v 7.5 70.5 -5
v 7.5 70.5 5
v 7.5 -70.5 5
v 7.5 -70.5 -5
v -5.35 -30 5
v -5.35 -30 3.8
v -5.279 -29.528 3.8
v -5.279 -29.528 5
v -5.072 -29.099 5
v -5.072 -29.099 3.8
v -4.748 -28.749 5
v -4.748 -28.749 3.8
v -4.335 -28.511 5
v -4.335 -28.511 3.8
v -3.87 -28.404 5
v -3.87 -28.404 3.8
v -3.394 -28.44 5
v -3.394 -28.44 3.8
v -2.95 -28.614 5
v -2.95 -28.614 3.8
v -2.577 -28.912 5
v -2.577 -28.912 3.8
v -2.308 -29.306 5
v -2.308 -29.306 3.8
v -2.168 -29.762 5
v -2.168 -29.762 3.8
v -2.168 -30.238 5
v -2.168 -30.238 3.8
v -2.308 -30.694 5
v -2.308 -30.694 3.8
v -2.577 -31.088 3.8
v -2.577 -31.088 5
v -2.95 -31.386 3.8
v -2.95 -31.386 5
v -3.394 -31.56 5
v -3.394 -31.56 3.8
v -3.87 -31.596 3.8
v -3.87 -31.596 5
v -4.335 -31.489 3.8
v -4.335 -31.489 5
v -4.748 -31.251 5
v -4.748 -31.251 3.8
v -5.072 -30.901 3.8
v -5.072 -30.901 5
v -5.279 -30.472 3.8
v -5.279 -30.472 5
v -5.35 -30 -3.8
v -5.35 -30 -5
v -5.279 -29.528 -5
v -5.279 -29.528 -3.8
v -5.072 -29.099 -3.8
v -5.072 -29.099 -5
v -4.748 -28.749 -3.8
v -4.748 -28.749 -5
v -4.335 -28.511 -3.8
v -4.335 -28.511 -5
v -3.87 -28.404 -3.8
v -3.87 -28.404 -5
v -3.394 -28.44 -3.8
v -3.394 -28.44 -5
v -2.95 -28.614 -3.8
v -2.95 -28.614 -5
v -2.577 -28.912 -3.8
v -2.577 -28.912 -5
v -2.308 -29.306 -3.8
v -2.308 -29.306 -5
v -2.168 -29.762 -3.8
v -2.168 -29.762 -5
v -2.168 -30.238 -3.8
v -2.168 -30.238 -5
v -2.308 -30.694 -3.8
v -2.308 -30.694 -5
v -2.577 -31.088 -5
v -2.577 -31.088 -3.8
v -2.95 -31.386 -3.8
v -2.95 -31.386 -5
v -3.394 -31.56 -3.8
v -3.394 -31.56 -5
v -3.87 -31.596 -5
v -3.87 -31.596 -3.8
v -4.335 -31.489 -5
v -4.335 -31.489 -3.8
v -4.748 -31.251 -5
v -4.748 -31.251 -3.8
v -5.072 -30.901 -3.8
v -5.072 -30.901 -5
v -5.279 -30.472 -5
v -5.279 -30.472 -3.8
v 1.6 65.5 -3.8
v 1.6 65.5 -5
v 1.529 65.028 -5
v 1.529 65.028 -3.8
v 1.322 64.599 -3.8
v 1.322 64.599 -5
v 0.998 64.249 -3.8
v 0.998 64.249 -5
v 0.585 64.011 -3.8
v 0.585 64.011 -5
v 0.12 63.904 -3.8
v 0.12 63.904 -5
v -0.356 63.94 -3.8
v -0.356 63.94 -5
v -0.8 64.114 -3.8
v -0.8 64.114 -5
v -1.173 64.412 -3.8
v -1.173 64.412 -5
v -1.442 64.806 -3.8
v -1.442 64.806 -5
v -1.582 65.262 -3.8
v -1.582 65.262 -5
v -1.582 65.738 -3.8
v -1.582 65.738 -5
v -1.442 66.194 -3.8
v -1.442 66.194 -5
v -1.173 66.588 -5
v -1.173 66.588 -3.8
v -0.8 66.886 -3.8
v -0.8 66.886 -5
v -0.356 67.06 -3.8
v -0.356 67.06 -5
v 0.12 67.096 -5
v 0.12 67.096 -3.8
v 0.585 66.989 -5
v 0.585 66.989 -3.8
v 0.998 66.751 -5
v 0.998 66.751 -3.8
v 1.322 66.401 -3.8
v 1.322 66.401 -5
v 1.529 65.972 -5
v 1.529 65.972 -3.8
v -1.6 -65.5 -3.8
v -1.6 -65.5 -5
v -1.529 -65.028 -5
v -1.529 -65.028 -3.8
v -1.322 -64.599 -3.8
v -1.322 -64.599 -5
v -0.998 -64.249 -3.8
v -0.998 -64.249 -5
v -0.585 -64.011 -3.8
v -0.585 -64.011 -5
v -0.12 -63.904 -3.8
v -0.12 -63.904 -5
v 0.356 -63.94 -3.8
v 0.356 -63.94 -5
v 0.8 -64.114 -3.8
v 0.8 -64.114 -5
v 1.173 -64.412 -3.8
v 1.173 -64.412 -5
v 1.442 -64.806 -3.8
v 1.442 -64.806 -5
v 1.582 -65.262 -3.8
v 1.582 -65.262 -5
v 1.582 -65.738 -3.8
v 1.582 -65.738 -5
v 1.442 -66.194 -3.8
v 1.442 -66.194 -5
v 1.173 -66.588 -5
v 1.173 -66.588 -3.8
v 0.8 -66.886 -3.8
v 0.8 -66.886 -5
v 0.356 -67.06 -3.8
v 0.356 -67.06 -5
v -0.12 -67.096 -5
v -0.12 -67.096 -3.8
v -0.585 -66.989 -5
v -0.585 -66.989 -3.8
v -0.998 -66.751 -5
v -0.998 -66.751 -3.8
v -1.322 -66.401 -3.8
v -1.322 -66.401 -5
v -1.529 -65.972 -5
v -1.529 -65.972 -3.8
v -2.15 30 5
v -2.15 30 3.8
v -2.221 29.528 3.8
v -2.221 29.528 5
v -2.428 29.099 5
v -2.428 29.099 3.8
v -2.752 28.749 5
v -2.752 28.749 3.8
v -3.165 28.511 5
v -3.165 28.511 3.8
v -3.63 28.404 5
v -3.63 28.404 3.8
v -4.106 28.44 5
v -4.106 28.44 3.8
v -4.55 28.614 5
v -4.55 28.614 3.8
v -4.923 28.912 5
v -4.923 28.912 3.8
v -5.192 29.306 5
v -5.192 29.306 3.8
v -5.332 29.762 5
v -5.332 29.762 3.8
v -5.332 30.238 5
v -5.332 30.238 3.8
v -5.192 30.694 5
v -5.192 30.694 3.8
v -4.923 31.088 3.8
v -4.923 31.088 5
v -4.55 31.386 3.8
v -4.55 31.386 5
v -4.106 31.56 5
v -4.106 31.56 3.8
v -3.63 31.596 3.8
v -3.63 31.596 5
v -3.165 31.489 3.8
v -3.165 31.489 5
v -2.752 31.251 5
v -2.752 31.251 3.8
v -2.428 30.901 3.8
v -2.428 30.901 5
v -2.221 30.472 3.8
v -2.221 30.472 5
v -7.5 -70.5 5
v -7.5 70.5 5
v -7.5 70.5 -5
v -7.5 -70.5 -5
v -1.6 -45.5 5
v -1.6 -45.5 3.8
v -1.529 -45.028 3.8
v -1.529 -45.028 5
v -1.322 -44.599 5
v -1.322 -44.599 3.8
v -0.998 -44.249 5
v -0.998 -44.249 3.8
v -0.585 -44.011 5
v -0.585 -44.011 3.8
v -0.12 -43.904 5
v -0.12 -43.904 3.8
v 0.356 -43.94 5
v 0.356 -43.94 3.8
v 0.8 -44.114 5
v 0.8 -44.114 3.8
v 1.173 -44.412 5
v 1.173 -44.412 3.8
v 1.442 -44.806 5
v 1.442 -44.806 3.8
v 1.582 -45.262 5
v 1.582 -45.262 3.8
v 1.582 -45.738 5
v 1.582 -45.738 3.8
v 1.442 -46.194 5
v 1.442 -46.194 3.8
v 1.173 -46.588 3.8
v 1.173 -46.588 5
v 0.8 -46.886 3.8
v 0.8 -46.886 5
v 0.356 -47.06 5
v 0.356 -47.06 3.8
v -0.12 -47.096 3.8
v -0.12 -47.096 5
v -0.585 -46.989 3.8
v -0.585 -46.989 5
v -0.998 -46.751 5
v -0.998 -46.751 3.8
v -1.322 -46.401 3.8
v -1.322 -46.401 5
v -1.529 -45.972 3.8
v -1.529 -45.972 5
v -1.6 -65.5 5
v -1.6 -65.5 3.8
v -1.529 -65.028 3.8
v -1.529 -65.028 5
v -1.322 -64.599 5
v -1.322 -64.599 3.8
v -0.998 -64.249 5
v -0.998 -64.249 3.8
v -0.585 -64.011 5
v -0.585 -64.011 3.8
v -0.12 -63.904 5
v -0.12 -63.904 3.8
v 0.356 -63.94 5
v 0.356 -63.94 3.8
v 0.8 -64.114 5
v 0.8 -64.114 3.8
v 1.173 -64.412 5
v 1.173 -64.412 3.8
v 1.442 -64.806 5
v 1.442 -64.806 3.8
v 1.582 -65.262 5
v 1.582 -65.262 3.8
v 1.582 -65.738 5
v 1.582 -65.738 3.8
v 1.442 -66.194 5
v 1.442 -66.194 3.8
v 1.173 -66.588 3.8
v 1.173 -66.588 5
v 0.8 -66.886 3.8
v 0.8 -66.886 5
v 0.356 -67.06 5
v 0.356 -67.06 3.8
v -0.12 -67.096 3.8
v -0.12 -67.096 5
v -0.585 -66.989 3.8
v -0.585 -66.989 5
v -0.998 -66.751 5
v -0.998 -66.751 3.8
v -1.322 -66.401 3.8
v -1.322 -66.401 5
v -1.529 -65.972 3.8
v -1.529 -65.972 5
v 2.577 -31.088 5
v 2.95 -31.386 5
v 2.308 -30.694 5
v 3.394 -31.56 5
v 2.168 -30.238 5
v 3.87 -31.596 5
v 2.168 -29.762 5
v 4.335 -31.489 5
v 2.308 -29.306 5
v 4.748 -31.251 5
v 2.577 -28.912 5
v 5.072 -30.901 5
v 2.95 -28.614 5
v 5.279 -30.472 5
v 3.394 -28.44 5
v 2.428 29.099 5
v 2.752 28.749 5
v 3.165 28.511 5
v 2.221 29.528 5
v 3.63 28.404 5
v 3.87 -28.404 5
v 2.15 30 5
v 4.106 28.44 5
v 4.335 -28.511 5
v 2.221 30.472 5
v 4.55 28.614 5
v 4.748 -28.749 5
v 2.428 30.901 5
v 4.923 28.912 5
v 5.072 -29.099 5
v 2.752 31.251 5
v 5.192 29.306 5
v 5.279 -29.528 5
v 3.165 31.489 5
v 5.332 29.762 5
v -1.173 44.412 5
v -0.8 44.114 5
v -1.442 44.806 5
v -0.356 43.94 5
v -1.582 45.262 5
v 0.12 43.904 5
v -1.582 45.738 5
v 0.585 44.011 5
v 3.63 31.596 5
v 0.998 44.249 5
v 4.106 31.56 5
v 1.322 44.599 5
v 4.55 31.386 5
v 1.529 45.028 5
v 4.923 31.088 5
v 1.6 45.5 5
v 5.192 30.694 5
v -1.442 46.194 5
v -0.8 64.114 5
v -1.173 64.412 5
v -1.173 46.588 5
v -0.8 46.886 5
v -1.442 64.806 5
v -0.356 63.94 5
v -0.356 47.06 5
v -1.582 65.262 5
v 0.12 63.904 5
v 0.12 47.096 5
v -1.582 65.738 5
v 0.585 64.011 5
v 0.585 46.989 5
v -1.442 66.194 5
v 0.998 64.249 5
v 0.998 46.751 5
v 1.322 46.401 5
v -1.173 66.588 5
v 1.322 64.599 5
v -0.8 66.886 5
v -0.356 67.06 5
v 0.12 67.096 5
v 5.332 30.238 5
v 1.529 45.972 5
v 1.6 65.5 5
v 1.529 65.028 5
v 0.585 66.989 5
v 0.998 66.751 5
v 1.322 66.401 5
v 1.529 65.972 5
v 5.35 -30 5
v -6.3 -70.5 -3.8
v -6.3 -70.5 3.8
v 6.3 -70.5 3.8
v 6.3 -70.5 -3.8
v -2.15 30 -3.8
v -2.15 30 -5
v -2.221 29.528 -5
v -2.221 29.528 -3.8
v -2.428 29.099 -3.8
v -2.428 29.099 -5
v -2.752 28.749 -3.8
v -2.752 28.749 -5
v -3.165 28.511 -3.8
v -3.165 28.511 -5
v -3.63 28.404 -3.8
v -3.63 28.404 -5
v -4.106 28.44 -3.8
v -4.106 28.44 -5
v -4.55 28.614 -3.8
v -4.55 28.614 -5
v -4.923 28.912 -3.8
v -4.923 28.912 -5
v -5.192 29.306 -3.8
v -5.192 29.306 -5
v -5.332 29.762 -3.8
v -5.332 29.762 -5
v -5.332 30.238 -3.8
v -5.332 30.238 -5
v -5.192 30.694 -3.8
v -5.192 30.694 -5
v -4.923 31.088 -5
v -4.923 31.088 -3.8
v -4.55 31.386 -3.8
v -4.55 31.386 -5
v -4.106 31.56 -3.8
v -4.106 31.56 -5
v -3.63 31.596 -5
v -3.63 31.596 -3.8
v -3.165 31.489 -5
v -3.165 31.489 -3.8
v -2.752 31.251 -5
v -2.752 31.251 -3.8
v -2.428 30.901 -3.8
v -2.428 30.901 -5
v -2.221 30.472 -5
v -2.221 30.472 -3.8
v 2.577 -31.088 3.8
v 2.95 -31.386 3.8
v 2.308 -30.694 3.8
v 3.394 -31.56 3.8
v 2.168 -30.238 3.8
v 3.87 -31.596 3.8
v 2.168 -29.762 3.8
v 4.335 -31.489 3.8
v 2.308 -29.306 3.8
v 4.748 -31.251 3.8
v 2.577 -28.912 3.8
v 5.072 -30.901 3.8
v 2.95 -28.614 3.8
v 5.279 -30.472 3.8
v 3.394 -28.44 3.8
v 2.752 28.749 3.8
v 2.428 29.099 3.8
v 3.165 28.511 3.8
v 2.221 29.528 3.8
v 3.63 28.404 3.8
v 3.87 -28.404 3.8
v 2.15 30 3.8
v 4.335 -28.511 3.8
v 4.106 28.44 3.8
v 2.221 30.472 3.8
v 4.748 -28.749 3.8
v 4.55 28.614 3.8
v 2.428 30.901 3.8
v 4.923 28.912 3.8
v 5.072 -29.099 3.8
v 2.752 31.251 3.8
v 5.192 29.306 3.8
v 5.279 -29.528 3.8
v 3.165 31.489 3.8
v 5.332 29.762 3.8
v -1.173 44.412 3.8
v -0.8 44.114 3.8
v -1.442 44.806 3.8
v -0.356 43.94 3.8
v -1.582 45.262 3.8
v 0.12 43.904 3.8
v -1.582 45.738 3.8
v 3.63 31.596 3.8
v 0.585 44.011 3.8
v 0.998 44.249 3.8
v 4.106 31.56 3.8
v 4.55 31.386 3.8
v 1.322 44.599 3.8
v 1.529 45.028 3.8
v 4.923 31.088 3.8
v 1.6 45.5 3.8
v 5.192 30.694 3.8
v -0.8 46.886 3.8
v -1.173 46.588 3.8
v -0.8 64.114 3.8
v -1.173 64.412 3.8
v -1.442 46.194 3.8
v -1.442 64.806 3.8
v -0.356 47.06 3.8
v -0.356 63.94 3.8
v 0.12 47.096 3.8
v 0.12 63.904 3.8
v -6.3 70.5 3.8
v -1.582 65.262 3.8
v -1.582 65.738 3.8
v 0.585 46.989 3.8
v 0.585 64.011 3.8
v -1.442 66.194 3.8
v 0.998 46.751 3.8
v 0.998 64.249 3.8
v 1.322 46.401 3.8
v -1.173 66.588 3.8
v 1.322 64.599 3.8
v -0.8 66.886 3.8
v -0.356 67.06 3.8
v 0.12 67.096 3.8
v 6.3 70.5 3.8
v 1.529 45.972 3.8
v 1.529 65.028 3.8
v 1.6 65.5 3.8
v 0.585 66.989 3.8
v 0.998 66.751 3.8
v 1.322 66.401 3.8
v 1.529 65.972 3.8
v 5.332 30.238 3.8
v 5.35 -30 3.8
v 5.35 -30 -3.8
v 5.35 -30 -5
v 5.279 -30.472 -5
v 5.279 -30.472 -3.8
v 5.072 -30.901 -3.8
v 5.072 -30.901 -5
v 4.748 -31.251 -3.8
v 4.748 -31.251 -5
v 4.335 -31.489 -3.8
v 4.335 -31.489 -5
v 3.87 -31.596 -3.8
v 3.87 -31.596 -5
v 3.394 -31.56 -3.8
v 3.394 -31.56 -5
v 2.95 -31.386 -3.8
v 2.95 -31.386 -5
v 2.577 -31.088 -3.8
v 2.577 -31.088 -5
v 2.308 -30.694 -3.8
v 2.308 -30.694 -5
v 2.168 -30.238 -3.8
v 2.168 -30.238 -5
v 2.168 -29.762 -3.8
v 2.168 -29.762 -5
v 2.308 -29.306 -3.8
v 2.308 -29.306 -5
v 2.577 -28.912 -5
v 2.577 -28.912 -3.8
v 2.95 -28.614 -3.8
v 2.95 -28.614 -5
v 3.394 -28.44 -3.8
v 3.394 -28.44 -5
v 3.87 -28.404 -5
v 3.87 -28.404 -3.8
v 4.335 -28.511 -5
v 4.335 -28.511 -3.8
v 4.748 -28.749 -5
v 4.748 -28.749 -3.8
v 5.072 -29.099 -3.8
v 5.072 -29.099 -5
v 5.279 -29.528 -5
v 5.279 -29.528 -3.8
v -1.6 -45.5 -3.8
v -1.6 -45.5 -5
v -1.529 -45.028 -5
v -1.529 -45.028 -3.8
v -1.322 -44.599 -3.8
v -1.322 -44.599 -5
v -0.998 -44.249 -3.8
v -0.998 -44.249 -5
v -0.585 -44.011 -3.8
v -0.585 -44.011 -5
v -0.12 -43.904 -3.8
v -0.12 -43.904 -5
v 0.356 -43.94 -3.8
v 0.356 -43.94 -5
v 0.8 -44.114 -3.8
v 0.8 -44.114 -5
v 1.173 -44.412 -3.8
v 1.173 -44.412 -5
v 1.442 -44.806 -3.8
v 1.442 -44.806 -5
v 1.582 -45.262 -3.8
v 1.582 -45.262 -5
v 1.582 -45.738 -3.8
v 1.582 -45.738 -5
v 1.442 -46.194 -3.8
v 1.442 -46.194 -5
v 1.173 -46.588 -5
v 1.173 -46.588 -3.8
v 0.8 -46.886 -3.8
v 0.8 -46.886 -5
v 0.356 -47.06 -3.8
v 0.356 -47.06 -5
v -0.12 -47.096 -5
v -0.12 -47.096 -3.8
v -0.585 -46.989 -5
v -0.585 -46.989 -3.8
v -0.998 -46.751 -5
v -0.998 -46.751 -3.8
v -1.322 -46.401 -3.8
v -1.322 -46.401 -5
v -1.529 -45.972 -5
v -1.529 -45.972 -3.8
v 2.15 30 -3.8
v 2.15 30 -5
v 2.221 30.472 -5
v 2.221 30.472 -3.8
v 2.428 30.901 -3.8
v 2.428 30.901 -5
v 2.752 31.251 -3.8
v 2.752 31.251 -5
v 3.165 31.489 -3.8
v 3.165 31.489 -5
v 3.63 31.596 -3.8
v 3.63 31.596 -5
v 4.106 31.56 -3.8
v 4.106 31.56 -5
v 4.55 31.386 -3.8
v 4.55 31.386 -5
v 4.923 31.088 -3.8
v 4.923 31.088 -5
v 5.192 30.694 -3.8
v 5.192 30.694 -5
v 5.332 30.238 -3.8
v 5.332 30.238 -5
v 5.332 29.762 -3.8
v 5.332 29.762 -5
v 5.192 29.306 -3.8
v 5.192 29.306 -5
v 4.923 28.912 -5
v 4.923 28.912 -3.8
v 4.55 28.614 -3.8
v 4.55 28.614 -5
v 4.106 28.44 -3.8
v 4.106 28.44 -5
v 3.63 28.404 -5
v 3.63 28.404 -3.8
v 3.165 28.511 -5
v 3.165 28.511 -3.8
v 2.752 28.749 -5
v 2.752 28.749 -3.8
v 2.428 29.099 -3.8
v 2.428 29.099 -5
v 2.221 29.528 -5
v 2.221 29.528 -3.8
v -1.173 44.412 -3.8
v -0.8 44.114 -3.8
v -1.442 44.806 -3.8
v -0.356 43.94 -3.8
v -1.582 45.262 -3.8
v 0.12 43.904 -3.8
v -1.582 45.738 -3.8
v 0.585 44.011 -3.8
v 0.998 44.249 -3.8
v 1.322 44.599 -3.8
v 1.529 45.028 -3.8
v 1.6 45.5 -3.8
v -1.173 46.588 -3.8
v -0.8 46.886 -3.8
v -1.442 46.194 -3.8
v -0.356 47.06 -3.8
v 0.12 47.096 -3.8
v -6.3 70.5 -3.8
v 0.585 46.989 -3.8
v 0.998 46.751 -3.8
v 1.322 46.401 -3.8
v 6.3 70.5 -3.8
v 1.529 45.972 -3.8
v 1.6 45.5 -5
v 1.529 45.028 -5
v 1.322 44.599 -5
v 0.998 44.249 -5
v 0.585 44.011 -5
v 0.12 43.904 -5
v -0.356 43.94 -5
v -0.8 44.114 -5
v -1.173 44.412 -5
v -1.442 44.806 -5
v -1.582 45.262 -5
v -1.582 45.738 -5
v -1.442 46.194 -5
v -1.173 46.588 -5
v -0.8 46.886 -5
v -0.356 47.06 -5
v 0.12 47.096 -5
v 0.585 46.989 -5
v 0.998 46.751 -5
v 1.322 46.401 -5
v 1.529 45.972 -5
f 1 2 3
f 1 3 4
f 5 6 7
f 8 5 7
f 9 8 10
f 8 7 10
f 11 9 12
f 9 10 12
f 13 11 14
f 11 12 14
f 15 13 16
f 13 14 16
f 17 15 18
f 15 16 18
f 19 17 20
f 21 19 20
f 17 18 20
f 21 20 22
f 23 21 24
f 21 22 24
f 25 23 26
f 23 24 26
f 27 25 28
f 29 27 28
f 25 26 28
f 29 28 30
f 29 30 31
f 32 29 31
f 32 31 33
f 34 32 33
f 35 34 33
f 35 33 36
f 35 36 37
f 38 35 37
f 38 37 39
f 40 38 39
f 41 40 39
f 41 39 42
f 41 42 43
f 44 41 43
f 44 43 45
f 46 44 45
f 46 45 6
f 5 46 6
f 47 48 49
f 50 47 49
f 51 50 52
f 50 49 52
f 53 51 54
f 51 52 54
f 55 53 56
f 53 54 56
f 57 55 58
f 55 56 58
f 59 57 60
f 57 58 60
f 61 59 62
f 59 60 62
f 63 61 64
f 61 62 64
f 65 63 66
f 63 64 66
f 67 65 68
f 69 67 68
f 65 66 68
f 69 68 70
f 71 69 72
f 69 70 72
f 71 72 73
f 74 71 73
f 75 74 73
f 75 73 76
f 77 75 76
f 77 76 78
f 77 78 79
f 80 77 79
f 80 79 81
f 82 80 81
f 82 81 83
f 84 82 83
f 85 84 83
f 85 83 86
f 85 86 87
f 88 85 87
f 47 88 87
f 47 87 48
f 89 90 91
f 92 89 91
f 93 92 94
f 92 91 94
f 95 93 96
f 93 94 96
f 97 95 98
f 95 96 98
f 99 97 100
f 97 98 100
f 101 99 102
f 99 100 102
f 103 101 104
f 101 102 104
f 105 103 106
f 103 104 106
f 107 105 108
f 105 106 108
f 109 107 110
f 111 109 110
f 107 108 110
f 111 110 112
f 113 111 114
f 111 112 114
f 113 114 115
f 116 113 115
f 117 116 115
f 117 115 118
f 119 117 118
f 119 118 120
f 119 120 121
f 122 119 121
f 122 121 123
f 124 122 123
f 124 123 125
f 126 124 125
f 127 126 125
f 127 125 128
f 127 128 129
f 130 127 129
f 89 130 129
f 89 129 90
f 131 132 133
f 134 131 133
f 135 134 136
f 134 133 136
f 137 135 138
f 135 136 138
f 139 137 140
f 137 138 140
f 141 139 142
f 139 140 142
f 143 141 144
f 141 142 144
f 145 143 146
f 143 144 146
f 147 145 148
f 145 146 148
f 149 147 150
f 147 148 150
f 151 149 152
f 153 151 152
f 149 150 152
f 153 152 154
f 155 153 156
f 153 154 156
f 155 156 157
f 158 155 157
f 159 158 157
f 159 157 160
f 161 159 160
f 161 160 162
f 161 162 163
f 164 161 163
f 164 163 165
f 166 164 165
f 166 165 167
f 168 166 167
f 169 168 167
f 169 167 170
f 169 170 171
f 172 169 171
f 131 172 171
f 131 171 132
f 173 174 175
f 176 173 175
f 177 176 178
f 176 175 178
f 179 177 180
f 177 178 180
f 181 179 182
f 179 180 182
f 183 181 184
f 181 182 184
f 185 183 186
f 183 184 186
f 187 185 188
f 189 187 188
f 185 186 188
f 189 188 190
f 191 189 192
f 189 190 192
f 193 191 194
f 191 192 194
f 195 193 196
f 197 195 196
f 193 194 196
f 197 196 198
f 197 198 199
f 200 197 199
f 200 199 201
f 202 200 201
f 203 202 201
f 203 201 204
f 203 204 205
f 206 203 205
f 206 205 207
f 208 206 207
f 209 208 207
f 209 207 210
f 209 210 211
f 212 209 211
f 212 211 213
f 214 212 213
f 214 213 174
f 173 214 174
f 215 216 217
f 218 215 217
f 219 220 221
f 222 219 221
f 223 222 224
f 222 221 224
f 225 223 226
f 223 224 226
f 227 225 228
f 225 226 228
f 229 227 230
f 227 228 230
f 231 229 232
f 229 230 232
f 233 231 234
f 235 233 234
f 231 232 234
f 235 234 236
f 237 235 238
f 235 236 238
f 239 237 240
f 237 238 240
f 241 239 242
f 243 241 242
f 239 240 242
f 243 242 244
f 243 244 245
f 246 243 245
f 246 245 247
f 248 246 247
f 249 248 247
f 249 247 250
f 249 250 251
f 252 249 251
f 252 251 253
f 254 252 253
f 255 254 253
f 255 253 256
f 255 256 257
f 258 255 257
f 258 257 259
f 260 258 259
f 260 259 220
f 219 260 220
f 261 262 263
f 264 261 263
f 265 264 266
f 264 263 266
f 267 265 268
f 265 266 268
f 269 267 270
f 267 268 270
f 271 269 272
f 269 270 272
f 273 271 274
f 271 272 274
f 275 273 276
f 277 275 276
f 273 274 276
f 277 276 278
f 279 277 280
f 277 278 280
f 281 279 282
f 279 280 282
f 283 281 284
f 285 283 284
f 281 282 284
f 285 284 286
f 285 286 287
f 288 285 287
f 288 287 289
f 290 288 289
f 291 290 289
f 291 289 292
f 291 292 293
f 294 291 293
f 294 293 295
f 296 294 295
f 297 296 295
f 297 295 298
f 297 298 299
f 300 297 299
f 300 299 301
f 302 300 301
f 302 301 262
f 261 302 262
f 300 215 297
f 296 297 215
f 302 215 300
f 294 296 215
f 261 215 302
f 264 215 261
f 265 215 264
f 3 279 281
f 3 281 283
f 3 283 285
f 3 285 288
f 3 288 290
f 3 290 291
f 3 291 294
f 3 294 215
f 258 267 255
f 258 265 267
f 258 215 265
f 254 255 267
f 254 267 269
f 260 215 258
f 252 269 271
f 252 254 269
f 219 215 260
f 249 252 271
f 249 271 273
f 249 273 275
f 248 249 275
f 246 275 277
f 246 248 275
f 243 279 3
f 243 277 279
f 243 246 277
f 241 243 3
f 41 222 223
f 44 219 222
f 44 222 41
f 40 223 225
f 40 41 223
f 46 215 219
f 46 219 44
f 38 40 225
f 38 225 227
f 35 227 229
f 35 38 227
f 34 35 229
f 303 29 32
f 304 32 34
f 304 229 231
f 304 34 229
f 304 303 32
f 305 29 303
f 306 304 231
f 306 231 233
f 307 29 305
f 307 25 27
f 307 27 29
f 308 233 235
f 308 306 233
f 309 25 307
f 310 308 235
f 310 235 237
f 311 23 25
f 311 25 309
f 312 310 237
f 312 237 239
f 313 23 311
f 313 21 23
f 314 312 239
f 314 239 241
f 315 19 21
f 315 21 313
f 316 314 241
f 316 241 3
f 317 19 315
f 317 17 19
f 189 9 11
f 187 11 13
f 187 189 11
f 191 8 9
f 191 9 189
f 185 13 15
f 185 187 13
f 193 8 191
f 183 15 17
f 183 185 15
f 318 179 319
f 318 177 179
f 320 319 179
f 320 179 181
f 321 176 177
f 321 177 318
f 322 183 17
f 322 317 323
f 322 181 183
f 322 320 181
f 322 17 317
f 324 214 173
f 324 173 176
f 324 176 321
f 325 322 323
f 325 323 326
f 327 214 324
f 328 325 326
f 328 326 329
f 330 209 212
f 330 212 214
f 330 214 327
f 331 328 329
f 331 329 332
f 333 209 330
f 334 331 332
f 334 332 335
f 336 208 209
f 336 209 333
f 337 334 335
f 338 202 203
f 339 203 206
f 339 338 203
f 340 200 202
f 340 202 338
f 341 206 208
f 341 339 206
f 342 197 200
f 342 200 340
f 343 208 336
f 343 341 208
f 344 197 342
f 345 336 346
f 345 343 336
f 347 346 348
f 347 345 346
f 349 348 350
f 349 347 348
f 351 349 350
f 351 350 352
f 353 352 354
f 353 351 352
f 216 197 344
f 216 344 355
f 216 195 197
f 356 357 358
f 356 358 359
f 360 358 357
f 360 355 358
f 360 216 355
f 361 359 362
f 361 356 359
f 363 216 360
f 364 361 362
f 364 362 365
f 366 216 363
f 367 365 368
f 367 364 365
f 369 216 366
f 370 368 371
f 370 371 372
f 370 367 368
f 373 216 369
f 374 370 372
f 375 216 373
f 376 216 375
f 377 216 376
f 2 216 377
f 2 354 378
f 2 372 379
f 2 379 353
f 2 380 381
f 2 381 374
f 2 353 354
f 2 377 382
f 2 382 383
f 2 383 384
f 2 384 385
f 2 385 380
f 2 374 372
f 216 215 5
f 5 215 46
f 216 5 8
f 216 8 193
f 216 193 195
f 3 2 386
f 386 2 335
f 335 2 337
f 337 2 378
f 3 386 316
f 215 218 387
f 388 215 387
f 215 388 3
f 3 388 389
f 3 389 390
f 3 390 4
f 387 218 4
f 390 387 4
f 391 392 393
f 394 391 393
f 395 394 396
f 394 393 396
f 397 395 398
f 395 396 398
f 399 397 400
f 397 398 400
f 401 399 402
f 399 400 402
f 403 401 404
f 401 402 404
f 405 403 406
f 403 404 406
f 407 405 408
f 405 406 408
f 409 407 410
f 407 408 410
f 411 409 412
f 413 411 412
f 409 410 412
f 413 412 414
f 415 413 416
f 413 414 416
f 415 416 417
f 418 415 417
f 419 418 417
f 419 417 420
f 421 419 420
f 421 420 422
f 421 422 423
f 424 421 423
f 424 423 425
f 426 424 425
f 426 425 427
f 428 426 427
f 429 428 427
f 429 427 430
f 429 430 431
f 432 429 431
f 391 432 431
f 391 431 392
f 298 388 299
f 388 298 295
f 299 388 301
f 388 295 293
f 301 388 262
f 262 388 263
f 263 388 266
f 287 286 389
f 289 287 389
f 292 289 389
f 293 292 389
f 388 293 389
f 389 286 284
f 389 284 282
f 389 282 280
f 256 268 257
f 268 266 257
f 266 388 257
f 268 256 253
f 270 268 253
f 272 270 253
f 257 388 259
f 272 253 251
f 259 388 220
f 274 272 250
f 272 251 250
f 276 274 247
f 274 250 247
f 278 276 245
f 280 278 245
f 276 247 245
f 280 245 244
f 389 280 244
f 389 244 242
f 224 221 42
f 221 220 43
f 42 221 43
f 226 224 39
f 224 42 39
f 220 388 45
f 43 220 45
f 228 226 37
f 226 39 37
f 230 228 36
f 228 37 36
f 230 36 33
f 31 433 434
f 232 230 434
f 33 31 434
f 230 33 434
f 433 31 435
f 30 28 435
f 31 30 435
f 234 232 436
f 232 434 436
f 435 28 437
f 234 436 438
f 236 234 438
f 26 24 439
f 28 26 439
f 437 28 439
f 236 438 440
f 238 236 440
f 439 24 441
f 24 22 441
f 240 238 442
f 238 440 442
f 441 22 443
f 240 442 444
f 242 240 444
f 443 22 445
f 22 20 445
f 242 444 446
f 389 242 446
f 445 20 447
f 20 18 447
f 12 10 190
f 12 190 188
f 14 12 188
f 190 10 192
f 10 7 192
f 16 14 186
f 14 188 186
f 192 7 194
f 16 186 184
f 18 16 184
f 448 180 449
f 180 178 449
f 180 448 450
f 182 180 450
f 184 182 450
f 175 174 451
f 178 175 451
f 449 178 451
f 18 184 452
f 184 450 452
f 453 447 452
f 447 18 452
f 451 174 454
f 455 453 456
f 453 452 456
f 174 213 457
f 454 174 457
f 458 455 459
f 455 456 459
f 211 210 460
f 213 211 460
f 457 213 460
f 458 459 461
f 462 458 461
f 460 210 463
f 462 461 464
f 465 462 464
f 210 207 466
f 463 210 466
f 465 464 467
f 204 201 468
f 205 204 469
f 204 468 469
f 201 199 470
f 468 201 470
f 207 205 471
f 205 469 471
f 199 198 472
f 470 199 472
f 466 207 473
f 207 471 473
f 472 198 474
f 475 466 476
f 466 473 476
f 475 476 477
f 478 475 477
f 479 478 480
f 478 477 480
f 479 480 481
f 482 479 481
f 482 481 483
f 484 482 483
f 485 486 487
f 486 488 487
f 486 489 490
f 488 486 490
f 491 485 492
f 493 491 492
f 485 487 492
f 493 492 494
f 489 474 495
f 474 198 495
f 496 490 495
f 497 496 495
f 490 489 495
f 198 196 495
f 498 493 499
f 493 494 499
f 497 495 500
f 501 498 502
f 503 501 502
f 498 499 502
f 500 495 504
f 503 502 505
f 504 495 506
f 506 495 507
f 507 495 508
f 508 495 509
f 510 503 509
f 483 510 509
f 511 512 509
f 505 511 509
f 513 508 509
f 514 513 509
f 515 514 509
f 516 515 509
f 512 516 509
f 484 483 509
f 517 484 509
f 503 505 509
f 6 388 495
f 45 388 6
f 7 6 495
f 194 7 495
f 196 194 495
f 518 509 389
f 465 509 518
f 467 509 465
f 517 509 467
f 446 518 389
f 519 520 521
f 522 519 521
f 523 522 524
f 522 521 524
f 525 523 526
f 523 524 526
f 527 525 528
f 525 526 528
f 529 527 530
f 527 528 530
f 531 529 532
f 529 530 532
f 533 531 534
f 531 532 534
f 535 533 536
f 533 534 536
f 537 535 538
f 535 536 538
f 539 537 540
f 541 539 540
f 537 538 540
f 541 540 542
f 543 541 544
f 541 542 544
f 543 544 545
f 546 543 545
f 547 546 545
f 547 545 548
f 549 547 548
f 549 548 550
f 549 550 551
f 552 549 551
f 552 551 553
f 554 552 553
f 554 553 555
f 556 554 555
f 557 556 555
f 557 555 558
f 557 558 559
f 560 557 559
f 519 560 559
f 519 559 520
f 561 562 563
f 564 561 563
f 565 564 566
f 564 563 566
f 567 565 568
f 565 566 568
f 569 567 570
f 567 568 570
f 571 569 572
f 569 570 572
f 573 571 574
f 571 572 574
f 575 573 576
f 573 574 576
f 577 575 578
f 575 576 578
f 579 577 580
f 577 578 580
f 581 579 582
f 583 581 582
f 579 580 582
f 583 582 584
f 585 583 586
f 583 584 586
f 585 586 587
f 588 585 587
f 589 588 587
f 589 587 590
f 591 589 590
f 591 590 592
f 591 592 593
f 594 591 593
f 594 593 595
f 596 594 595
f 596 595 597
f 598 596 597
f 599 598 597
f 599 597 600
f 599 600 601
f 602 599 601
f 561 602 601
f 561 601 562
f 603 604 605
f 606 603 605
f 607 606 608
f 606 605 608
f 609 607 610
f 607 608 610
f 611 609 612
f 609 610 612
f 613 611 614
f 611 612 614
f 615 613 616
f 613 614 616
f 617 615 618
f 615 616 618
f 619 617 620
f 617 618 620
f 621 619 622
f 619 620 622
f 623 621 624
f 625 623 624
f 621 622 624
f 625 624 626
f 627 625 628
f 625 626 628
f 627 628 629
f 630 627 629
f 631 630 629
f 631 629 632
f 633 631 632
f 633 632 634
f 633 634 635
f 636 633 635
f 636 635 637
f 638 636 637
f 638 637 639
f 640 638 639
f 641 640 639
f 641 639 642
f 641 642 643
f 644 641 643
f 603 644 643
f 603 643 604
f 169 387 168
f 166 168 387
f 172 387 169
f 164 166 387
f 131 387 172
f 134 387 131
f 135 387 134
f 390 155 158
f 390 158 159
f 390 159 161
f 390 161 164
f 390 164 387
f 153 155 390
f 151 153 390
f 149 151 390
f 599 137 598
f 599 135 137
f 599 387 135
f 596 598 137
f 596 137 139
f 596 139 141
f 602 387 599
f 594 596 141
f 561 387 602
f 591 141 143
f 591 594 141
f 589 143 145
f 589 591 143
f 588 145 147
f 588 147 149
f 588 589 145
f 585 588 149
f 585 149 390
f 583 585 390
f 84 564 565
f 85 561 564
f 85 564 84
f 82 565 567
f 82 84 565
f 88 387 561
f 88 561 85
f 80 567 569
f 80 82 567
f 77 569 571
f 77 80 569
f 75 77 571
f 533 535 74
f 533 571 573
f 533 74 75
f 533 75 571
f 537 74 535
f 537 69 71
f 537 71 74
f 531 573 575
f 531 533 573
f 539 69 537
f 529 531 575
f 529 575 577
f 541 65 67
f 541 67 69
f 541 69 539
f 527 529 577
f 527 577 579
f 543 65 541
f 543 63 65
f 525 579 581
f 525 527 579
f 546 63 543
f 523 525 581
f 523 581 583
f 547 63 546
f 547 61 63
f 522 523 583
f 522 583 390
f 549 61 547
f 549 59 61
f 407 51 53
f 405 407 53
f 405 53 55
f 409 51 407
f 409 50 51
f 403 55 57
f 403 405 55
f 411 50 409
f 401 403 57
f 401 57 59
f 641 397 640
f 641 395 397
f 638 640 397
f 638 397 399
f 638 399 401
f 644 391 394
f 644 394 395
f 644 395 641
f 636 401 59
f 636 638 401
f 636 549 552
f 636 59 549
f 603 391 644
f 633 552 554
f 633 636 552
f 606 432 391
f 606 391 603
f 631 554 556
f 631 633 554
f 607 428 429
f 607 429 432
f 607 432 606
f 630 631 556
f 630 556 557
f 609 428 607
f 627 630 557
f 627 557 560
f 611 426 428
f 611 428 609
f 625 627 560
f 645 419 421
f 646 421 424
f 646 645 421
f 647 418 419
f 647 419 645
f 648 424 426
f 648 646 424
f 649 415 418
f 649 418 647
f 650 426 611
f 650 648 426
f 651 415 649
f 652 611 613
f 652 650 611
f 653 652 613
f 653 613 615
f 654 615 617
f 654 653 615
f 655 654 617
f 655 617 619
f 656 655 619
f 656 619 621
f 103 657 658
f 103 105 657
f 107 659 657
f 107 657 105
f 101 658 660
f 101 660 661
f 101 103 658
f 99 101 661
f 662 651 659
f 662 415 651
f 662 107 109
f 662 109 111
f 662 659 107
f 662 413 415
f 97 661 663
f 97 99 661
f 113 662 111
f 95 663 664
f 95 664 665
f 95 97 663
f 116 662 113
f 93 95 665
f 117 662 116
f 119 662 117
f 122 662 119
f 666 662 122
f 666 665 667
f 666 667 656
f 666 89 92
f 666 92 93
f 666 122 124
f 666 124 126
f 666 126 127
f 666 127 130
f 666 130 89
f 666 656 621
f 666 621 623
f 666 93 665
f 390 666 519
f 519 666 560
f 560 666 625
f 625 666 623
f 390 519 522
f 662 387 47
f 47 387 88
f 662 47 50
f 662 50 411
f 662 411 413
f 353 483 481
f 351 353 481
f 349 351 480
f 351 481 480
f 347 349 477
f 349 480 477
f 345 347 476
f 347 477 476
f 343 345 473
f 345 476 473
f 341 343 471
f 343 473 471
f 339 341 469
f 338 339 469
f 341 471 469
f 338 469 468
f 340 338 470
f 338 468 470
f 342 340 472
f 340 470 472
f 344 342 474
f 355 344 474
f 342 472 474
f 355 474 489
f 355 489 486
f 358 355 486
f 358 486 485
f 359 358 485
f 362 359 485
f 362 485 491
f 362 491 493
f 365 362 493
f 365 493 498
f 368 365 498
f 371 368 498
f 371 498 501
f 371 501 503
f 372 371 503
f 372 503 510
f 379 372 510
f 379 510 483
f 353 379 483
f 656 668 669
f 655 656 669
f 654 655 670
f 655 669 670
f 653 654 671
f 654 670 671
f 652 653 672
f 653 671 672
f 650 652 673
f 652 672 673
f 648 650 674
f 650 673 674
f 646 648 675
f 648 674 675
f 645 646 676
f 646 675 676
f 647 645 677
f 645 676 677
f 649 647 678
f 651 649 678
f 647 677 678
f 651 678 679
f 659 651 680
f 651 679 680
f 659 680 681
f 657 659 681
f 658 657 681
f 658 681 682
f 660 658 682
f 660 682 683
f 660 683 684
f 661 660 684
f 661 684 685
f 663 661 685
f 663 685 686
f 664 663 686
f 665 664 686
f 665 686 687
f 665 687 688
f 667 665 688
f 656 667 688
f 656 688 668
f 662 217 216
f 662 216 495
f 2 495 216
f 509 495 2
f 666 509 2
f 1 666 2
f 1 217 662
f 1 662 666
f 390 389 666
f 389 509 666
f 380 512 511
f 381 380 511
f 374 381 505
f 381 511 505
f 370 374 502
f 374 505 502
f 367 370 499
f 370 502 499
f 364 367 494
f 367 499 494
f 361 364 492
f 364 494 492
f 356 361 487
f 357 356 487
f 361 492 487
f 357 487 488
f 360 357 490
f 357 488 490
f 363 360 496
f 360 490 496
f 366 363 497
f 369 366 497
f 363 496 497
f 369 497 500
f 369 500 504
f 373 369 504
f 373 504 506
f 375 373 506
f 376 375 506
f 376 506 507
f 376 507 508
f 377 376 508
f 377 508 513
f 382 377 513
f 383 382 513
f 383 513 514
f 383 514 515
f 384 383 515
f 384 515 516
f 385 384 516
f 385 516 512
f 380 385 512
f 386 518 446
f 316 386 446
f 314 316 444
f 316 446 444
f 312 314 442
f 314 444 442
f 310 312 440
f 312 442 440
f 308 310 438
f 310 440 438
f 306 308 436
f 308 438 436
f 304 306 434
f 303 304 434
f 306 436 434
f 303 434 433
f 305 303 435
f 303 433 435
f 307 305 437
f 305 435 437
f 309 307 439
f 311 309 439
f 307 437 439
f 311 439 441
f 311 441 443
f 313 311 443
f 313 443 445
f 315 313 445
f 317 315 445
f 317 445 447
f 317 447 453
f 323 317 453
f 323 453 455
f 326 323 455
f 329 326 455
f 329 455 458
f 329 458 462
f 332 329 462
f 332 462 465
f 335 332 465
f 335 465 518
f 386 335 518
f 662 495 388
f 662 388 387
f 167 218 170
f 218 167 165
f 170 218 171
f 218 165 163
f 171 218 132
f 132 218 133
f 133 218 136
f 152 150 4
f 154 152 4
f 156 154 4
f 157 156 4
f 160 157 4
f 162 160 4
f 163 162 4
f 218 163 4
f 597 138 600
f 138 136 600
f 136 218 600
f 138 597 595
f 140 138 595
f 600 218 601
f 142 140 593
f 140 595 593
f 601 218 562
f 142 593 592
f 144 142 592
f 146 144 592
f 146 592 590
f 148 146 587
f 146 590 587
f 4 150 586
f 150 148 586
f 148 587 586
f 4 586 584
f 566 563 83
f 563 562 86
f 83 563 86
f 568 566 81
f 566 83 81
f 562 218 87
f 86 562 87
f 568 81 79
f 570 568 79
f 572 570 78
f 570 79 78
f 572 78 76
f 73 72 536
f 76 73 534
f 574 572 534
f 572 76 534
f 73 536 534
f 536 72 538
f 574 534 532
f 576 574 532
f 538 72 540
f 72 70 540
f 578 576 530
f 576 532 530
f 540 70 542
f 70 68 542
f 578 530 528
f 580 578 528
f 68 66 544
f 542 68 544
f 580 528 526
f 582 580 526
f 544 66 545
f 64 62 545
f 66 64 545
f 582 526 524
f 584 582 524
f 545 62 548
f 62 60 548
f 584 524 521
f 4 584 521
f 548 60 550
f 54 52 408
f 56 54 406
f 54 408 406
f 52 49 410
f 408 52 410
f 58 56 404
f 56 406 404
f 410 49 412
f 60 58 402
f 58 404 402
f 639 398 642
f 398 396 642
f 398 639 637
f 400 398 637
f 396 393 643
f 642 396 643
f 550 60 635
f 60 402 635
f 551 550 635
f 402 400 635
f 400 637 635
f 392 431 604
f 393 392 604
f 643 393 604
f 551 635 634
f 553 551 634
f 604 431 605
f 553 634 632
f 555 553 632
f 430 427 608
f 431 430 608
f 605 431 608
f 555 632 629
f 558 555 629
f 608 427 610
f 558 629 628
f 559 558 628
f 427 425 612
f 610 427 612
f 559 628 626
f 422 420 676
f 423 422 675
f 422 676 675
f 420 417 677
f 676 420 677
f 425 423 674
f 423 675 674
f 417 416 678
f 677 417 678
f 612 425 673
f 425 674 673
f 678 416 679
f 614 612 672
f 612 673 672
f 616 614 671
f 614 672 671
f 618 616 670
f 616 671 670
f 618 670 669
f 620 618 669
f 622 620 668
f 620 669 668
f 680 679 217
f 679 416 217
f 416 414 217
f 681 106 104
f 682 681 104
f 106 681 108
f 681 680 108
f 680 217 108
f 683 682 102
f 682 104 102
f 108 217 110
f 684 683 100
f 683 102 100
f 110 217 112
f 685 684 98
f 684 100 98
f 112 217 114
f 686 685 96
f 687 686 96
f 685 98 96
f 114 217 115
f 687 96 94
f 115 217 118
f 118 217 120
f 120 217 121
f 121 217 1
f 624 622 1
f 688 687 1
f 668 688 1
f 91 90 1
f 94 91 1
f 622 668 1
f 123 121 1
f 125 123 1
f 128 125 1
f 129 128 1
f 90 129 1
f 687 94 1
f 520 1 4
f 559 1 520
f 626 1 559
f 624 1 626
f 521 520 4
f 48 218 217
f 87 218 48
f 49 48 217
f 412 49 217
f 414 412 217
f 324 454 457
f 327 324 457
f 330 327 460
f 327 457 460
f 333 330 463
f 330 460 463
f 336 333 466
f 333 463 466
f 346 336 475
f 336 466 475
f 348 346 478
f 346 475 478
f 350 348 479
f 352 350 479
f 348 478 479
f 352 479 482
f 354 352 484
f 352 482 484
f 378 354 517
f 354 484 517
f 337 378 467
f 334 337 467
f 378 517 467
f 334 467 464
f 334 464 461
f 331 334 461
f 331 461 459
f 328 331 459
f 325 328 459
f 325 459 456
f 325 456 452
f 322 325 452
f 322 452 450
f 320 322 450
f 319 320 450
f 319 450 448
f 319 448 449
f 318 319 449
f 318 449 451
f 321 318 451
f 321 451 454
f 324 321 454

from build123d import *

# Parameters (mm, degrees)
SKETCH_1_W          = 15
SKETCH_1_H          = 10
SKETCH_1_W_2        = 12.6
SKETCH_1_H_2        = 7.6
EXTRUDE_1_DEPTH     = 70.5
SKETCH_2_R          = 1.6
CUT_EXTRUDE_1_DEPTH = 100


with BuildPart() as part:
    # ｽｹｯﾁ1 → ﾎﾞｽ - 押し出し1 (new, symmetric)
    with BuildSketch(Plane(origin=(0, 0, 0), x_dir=(1, 0, 0), z_dir=(0, 1, 0))):
        Rectangle(SKETCH_1_W, SKETCH_1_H)
        Rectangle(SKETCH_1_W_2, SKETCH_1_H_2, mode=Mode.SUBTRACT)
    extrude(amount=EXTRUDE_1_DEPTH, both=True)

    # ｽｹｯﾁ2 → ｶｯﾄ - 押し出し1 (cut)
    with BuildSketch(Plane(origin=(0, 0, -5), x_dir=(-1, 0, 0), z_dir=(0, 0, -1))):
        with Locations((0, -65.5)):
            Circle(SKETCH_2_R)
        with Locations((0, -45.5)):
            Circle(SKETCH_2_R)
        with Locations(Location((0, 45.5, 0), (0, 0, 180))):
            Circle(SKETCH_2_R)
        with Locations(Location((0, 65.5, 0), (0, 0, 180))):
            Circle(SKETCH_2_R)
        with Locations((3.75, -30)):
            Circle(SKETCH_2_R)
        with Locations(Location((-3.75, -30, 0), (0, 0, 180))):
            Circle(SKETCH_2_R)
        with Locations((-3.75, 30)):
            Circle(SKETCH_2_R)
        with Locations(Location((3.75, 30, 0), (0, 0, 180))):
            Circle(SKETCH_2_R)
    extrude(amount=-CUT_EXTRUDE_1_DEPTH, mode=Mode.SUBTRACT)


solid = part.part
